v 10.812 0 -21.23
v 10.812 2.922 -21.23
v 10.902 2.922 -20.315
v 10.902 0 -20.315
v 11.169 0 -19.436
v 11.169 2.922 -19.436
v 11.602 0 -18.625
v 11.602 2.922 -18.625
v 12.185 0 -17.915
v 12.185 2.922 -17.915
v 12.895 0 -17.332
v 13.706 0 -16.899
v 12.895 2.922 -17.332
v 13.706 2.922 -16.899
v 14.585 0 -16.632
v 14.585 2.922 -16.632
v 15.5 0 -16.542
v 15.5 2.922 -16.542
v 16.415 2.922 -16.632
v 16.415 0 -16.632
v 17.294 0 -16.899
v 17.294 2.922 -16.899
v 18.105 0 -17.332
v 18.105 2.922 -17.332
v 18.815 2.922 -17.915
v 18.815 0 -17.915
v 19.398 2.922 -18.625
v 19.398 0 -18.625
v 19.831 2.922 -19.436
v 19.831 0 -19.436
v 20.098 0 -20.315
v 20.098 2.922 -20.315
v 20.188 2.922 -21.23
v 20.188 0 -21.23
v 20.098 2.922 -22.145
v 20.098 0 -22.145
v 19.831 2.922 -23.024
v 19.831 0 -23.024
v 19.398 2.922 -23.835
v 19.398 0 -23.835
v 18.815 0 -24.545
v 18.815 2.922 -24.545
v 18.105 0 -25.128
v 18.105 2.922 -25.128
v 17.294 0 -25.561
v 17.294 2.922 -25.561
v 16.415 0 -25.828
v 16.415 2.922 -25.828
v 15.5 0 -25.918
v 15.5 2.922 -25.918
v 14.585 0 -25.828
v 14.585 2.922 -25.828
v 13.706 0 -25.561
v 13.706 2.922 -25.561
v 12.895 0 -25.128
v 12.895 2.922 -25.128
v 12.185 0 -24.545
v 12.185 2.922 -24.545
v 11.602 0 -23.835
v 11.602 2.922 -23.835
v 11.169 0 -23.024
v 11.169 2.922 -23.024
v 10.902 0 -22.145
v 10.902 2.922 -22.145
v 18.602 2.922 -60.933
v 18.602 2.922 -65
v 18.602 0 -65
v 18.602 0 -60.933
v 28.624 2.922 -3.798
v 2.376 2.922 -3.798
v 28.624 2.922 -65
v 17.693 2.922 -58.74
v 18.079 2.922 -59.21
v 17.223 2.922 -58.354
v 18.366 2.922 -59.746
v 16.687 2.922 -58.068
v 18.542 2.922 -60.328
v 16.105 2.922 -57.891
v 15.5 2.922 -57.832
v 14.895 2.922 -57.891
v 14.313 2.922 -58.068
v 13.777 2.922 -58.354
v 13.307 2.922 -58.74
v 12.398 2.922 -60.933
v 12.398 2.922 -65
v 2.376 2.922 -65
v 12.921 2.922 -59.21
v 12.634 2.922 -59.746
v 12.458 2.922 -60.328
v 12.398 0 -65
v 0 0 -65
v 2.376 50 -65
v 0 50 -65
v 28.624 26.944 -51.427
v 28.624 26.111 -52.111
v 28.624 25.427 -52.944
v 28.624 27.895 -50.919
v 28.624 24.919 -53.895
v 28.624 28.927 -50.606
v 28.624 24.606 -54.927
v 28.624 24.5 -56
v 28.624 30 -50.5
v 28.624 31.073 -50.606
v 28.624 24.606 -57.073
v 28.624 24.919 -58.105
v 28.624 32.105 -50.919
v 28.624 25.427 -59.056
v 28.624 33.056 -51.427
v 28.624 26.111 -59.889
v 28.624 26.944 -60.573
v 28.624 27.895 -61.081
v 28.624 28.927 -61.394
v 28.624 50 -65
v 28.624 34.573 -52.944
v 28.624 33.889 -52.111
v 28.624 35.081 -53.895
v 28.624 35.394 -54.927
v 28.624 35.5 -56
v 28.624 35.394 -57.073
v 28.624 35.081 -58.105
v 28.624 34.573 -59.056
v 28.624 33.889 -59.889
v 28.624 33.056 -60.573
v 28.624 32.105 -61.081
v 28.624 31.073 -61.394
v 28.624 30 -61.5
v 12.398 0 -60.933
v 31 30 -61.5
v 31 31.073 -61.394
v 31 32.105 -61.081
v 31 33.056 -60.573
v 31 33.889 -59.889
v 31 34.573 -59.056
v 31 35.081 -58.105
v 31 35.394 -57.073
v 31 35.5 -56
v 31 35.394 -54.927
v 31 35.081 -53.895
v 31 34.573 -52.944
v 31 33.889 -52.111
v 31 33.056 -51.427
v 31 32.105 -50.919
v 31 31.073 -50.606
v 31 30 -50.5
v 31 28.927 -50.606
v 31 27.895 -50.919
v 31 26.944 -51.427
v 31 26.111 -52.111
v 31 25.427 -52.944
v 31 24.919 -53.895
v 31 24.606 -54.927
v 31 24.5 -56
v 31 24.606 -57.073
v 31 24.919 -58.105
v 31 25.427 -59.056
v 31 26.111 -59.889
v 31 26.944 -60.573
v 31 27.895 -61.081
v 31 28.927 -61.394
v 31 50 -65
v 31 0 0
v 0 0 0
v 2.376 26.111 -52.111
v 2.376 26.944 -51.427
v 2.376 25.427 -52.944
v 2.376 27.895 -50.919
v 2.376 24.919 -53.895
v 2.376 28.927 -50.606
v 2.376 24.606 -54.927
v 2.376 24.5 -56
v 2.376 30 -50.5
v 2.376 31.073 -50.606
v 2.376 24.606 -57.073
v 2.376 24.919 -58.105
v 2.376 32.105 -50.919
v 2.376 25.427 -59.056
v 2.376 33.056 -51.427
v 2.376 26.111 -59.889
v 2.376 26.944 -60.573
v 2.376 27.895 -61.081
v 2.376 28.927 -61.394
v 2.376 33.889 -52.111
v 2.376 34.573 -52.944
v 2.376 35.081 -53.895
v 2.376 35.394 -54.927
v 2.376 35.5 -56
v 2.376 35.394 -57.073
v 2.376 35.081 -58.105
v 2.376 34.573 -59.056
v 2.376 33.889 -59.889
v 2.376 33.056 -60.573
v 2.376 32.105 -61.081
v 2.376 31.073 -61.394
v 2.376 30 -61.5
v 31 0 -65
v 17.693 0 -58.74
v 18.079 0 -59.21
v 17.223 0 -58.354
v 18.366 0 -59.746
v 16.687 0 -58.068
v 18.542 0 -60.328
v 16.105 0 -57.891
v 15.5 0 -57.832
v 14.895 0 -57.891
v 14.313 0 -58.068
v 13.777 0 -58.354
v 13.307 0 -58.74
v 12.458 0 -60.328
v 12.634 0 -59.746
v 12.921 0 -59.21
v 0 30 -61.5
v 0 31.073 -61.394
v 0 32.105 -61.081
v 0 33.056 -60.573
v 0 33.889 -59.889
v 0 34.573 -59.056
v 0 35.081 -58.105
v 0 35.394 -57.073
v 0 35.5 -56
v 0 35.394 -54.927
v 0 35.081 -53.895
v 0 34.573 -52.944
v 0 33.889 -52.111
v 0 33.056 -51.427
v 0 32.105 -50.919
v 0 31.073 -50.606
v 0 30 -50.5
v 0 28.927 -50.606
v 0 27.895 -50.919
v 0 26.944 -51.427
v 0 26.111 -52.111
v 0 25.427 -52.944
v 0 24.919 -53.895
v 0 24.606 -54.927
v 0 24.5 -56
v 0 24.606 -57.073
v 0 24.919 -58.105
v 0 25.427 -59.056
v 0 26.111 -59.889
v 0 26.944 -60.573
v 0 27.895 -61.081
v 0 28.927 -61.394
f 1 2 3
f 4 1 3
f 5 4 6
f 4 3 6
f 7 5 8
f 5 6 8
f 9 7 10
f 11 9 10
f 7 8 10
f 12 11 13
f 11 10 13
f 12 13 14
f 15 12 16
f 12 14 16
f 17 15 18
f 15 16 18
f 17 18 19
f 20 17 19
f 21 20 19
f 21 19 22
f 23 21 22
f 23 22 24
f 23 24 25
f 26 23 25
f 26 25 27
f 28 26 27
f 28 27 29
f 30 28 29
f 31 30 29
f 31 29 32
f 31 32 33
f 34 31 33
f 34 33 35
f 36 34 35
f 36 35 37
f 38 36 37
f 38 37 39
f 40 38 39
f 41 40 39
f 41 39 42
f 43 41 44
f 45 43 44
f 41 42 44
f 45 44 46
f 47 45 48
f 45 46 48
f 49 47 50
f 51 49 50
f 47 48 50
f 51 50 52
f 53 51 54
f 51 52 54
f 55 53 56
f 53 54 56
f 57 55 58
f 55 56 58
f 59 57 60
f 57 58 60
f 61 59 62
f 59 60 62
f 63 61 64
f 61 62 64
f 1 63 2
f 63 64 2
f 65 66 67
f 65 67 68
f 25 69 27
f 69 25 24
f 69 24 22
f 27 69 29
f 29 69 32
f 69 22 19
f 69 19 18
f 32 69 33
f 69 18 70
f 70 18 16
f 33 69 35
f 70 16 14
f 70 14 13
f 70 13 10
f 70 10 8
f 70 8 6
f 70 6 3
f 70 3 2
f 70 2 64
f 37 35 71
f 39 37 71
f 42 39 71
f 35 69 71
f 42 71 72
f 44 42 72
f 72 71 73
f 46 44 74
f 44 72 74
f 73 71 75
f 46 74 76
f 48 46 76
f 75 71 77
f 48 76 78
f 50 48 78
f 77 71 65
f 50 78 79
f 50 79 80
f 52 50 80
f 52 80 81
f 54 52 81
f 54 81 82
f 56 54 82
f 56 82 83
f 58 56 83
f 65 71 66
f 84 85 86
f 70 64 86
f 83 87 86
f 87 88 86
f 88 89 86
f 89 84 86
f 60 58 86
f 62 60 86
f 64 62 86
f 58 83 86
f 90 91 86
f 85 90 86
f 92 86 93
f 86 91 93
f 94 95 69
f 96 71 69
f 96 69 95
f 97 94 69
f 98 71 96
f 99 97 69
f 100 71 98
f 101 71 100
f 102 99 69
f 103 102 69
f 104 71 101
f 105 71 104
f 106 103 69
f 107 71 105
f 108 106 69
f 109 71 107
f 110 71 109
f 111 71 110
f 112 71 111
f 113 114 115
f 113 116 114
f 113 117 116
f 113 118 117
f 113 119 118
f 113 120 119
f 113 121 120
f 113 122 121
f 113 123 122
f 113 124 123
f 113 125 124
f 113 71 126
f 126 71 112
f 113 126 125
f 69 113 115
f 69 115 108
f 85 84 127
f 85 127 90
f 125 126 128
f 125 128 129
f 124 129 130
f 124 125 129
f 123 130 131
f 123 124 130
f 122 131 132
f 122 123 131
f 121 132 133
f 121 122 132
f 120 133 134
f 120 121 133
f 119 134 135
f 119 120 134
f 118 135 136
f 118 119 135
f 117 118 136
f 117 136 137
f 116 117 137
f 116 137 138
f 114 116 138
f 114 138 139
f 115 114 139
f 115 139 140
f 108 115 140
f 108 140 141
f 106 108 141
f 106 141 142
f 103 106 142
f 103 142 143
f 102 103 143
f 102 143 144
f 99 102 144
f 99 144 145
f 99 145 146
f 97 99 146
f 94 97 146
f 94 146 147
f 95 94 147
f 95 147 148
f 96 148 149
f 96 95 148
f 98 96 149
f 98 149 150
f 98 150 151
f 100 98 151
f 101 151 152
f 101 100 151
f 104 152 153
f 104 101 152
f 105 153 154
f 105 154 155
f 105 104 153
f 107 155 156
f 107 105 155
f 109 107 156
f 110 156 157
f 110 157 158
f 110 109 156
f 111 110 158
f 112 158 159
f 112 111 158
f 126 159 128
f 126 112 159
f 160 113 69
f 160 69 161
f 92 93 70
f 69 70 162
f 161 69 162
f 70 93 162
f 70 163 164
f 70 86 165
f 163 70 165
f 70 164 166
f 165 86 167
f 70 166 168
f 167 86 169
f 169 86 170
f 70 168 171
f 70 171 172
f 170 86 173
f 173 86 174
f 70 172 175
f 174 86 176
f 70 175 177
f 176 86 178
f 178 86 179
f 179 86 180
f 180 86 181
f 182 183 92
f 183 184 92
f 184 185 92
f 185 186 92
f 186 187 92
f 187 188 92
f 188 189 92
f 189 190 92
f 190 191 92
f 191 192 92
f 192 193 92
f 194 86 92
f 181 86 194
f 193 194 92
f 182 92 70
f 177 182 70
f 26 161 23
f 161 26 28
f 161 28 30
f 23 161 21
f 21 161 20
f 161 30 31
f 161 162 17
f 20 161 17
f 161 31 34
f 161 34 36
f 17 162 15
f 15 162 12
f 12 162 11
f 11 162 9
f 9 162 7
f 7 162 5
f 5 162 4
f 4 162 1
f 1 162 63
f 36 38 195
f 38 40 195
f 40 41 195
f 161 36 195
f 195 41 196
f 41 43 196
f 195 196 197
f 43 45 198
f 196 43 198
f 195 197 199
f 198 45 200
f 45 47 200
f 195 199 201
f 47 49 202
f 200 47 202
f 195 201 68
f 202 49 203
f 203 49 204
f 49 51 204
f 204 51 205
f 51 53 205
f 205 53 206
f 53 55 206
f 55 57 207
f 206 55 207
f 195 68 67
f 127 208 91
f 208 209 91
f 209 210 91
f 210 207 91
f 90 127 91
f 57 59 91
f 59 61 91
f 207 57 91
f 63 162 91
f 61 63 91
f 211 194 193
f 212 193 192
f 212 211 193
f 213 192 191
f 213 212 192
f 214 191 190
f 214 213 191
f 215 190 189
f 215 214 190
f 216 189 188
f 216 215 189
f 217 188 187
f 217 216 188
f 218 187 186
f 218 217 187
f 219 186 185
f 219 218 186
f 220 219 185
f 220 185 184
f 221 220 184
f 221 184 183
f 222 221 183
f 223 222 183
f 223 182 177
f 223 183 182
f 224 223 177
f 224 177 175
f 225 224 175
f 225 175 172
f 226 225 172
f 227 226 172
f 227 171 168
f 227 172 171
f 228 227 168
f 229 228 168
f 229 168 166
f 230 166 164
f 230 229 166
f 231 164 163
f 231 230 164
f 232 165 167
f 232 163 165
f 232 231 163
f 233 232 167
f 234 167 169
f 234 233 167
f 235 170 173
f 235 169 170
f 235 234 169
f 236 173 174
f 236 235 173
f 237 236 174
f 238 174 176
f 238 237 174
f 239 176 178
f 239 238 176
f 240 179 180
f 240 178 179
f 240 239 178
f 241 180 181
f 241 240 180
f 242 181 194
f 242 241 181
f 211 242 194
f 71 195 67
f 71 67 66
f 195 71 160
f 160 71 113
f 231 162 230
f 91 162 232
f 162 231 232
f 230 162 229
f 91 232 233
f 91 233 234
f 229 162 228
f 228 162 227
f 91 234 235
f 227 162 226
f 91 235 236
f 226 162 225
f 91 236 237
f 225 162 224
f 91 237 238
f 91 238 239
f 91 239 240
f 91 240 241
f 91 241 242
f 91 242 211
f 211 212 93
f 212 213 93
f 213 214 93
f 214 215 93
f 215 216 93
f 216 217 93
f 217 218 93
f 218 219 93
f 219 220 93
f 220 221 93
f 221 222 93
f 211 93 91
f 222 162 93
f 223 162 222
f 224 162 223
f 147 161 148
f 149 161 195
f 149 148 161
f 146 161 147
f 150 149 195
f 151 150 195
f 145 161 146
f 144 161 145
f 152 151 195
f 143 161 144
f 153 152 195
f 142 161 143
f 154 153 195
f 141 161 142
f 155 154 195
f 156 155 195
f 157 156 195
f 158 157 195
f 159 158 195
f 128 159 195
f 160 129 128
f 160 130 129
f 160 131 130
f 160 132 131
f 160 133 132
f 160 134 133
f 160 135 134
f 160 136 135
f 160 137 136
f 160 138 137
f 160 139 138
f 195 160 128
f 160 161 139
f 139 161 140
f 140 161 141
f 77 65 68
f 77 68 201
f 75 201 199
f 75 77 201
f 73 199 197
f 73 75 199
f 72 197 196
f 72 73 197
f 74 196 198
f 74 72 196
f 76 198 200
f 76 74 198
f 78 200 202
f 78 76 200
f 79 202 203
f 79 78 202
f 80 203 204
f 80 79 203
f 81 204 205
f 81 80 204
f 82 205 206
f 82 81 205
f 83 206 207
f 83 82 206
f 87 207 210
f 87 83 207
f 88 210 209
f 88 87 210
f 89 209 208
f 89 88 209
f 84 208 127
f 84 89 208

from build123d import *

# Parameters (mm, degrees)
SKETCH1_R           = 5.5
BOSS_EXTRUDE1_DEPTH = 31
SKETCH2_W           = 26.247455066
SKETCH2_H           = 52.217390052
CUT_EXTRUDE1_DEPTH  = 88.669835177
SKETCH5_R           = 4.688216148
CUT_EXTRUDE2_DEPTH  = 87.036927024


with BuildPart() as part:
    # Sketch1 → Boss-Extrude1 (new body)
    with BuildSketch(Plane(origin=(0, 0, 0), x_dir=(0, 0, -1), z_dir=(1, 0, 0))):
        Polygon((0, 0), (65, 0), (65, 50), align=None)
        with Locations((56, 30)):
            Circle(SKETCH1_R, mode=Mode.SUBTRACT)
    extrude(amount=BOSS_EXTRUDE1_DEPTH)

    # Sketch2 → Cut-Extrude1 (cut, through all)
    with BuildSketch(Plane(origin=(0, 0, -65), x_dir=(-1, 0, 0), z_dir=(0, 0, -1))):
        with Locations((-15.5, 29.030538608)):
            Rectangle(SKETCH2_W, SKETCH2_H)
    extrude(amount=-CUT_EXTRUDE1_DEPTH, mode=Mode.SUBTRACT)

    # Sketch5 → Cut-Extrude2 (cut, through all)
    with BuildSketch(Plane(origin=(0, 2.921843582, 0), x_dir=(1, 0, 0), z_dir=(0, 1, 0))):
        with Locations(Location((15.5, 21.230034951, 0), (0, 0, 180))):
            Circle(SKETCH5_R)
        with BuildLine():
            Line((18.601825243, 76.649312621), (18.601825243, 60.933398058))
            ThreePointArc((18.601825243, 60.933398058), (15.5, 57.831572816), (12.398174757, 60.933398058))
            Line((12.398174757, 60.933398058), (12.398174757, 76.649312621))
            ThreePointArc((12.398174757, 76.649312621), (15.5, 79.751137864), (18.601825243, 76.649312621))
        make_face()
    extrude(amount=-CUT_EXTRUDE2_DEPTH, mode=Mode.SUBTRACT)


solid = part.part
